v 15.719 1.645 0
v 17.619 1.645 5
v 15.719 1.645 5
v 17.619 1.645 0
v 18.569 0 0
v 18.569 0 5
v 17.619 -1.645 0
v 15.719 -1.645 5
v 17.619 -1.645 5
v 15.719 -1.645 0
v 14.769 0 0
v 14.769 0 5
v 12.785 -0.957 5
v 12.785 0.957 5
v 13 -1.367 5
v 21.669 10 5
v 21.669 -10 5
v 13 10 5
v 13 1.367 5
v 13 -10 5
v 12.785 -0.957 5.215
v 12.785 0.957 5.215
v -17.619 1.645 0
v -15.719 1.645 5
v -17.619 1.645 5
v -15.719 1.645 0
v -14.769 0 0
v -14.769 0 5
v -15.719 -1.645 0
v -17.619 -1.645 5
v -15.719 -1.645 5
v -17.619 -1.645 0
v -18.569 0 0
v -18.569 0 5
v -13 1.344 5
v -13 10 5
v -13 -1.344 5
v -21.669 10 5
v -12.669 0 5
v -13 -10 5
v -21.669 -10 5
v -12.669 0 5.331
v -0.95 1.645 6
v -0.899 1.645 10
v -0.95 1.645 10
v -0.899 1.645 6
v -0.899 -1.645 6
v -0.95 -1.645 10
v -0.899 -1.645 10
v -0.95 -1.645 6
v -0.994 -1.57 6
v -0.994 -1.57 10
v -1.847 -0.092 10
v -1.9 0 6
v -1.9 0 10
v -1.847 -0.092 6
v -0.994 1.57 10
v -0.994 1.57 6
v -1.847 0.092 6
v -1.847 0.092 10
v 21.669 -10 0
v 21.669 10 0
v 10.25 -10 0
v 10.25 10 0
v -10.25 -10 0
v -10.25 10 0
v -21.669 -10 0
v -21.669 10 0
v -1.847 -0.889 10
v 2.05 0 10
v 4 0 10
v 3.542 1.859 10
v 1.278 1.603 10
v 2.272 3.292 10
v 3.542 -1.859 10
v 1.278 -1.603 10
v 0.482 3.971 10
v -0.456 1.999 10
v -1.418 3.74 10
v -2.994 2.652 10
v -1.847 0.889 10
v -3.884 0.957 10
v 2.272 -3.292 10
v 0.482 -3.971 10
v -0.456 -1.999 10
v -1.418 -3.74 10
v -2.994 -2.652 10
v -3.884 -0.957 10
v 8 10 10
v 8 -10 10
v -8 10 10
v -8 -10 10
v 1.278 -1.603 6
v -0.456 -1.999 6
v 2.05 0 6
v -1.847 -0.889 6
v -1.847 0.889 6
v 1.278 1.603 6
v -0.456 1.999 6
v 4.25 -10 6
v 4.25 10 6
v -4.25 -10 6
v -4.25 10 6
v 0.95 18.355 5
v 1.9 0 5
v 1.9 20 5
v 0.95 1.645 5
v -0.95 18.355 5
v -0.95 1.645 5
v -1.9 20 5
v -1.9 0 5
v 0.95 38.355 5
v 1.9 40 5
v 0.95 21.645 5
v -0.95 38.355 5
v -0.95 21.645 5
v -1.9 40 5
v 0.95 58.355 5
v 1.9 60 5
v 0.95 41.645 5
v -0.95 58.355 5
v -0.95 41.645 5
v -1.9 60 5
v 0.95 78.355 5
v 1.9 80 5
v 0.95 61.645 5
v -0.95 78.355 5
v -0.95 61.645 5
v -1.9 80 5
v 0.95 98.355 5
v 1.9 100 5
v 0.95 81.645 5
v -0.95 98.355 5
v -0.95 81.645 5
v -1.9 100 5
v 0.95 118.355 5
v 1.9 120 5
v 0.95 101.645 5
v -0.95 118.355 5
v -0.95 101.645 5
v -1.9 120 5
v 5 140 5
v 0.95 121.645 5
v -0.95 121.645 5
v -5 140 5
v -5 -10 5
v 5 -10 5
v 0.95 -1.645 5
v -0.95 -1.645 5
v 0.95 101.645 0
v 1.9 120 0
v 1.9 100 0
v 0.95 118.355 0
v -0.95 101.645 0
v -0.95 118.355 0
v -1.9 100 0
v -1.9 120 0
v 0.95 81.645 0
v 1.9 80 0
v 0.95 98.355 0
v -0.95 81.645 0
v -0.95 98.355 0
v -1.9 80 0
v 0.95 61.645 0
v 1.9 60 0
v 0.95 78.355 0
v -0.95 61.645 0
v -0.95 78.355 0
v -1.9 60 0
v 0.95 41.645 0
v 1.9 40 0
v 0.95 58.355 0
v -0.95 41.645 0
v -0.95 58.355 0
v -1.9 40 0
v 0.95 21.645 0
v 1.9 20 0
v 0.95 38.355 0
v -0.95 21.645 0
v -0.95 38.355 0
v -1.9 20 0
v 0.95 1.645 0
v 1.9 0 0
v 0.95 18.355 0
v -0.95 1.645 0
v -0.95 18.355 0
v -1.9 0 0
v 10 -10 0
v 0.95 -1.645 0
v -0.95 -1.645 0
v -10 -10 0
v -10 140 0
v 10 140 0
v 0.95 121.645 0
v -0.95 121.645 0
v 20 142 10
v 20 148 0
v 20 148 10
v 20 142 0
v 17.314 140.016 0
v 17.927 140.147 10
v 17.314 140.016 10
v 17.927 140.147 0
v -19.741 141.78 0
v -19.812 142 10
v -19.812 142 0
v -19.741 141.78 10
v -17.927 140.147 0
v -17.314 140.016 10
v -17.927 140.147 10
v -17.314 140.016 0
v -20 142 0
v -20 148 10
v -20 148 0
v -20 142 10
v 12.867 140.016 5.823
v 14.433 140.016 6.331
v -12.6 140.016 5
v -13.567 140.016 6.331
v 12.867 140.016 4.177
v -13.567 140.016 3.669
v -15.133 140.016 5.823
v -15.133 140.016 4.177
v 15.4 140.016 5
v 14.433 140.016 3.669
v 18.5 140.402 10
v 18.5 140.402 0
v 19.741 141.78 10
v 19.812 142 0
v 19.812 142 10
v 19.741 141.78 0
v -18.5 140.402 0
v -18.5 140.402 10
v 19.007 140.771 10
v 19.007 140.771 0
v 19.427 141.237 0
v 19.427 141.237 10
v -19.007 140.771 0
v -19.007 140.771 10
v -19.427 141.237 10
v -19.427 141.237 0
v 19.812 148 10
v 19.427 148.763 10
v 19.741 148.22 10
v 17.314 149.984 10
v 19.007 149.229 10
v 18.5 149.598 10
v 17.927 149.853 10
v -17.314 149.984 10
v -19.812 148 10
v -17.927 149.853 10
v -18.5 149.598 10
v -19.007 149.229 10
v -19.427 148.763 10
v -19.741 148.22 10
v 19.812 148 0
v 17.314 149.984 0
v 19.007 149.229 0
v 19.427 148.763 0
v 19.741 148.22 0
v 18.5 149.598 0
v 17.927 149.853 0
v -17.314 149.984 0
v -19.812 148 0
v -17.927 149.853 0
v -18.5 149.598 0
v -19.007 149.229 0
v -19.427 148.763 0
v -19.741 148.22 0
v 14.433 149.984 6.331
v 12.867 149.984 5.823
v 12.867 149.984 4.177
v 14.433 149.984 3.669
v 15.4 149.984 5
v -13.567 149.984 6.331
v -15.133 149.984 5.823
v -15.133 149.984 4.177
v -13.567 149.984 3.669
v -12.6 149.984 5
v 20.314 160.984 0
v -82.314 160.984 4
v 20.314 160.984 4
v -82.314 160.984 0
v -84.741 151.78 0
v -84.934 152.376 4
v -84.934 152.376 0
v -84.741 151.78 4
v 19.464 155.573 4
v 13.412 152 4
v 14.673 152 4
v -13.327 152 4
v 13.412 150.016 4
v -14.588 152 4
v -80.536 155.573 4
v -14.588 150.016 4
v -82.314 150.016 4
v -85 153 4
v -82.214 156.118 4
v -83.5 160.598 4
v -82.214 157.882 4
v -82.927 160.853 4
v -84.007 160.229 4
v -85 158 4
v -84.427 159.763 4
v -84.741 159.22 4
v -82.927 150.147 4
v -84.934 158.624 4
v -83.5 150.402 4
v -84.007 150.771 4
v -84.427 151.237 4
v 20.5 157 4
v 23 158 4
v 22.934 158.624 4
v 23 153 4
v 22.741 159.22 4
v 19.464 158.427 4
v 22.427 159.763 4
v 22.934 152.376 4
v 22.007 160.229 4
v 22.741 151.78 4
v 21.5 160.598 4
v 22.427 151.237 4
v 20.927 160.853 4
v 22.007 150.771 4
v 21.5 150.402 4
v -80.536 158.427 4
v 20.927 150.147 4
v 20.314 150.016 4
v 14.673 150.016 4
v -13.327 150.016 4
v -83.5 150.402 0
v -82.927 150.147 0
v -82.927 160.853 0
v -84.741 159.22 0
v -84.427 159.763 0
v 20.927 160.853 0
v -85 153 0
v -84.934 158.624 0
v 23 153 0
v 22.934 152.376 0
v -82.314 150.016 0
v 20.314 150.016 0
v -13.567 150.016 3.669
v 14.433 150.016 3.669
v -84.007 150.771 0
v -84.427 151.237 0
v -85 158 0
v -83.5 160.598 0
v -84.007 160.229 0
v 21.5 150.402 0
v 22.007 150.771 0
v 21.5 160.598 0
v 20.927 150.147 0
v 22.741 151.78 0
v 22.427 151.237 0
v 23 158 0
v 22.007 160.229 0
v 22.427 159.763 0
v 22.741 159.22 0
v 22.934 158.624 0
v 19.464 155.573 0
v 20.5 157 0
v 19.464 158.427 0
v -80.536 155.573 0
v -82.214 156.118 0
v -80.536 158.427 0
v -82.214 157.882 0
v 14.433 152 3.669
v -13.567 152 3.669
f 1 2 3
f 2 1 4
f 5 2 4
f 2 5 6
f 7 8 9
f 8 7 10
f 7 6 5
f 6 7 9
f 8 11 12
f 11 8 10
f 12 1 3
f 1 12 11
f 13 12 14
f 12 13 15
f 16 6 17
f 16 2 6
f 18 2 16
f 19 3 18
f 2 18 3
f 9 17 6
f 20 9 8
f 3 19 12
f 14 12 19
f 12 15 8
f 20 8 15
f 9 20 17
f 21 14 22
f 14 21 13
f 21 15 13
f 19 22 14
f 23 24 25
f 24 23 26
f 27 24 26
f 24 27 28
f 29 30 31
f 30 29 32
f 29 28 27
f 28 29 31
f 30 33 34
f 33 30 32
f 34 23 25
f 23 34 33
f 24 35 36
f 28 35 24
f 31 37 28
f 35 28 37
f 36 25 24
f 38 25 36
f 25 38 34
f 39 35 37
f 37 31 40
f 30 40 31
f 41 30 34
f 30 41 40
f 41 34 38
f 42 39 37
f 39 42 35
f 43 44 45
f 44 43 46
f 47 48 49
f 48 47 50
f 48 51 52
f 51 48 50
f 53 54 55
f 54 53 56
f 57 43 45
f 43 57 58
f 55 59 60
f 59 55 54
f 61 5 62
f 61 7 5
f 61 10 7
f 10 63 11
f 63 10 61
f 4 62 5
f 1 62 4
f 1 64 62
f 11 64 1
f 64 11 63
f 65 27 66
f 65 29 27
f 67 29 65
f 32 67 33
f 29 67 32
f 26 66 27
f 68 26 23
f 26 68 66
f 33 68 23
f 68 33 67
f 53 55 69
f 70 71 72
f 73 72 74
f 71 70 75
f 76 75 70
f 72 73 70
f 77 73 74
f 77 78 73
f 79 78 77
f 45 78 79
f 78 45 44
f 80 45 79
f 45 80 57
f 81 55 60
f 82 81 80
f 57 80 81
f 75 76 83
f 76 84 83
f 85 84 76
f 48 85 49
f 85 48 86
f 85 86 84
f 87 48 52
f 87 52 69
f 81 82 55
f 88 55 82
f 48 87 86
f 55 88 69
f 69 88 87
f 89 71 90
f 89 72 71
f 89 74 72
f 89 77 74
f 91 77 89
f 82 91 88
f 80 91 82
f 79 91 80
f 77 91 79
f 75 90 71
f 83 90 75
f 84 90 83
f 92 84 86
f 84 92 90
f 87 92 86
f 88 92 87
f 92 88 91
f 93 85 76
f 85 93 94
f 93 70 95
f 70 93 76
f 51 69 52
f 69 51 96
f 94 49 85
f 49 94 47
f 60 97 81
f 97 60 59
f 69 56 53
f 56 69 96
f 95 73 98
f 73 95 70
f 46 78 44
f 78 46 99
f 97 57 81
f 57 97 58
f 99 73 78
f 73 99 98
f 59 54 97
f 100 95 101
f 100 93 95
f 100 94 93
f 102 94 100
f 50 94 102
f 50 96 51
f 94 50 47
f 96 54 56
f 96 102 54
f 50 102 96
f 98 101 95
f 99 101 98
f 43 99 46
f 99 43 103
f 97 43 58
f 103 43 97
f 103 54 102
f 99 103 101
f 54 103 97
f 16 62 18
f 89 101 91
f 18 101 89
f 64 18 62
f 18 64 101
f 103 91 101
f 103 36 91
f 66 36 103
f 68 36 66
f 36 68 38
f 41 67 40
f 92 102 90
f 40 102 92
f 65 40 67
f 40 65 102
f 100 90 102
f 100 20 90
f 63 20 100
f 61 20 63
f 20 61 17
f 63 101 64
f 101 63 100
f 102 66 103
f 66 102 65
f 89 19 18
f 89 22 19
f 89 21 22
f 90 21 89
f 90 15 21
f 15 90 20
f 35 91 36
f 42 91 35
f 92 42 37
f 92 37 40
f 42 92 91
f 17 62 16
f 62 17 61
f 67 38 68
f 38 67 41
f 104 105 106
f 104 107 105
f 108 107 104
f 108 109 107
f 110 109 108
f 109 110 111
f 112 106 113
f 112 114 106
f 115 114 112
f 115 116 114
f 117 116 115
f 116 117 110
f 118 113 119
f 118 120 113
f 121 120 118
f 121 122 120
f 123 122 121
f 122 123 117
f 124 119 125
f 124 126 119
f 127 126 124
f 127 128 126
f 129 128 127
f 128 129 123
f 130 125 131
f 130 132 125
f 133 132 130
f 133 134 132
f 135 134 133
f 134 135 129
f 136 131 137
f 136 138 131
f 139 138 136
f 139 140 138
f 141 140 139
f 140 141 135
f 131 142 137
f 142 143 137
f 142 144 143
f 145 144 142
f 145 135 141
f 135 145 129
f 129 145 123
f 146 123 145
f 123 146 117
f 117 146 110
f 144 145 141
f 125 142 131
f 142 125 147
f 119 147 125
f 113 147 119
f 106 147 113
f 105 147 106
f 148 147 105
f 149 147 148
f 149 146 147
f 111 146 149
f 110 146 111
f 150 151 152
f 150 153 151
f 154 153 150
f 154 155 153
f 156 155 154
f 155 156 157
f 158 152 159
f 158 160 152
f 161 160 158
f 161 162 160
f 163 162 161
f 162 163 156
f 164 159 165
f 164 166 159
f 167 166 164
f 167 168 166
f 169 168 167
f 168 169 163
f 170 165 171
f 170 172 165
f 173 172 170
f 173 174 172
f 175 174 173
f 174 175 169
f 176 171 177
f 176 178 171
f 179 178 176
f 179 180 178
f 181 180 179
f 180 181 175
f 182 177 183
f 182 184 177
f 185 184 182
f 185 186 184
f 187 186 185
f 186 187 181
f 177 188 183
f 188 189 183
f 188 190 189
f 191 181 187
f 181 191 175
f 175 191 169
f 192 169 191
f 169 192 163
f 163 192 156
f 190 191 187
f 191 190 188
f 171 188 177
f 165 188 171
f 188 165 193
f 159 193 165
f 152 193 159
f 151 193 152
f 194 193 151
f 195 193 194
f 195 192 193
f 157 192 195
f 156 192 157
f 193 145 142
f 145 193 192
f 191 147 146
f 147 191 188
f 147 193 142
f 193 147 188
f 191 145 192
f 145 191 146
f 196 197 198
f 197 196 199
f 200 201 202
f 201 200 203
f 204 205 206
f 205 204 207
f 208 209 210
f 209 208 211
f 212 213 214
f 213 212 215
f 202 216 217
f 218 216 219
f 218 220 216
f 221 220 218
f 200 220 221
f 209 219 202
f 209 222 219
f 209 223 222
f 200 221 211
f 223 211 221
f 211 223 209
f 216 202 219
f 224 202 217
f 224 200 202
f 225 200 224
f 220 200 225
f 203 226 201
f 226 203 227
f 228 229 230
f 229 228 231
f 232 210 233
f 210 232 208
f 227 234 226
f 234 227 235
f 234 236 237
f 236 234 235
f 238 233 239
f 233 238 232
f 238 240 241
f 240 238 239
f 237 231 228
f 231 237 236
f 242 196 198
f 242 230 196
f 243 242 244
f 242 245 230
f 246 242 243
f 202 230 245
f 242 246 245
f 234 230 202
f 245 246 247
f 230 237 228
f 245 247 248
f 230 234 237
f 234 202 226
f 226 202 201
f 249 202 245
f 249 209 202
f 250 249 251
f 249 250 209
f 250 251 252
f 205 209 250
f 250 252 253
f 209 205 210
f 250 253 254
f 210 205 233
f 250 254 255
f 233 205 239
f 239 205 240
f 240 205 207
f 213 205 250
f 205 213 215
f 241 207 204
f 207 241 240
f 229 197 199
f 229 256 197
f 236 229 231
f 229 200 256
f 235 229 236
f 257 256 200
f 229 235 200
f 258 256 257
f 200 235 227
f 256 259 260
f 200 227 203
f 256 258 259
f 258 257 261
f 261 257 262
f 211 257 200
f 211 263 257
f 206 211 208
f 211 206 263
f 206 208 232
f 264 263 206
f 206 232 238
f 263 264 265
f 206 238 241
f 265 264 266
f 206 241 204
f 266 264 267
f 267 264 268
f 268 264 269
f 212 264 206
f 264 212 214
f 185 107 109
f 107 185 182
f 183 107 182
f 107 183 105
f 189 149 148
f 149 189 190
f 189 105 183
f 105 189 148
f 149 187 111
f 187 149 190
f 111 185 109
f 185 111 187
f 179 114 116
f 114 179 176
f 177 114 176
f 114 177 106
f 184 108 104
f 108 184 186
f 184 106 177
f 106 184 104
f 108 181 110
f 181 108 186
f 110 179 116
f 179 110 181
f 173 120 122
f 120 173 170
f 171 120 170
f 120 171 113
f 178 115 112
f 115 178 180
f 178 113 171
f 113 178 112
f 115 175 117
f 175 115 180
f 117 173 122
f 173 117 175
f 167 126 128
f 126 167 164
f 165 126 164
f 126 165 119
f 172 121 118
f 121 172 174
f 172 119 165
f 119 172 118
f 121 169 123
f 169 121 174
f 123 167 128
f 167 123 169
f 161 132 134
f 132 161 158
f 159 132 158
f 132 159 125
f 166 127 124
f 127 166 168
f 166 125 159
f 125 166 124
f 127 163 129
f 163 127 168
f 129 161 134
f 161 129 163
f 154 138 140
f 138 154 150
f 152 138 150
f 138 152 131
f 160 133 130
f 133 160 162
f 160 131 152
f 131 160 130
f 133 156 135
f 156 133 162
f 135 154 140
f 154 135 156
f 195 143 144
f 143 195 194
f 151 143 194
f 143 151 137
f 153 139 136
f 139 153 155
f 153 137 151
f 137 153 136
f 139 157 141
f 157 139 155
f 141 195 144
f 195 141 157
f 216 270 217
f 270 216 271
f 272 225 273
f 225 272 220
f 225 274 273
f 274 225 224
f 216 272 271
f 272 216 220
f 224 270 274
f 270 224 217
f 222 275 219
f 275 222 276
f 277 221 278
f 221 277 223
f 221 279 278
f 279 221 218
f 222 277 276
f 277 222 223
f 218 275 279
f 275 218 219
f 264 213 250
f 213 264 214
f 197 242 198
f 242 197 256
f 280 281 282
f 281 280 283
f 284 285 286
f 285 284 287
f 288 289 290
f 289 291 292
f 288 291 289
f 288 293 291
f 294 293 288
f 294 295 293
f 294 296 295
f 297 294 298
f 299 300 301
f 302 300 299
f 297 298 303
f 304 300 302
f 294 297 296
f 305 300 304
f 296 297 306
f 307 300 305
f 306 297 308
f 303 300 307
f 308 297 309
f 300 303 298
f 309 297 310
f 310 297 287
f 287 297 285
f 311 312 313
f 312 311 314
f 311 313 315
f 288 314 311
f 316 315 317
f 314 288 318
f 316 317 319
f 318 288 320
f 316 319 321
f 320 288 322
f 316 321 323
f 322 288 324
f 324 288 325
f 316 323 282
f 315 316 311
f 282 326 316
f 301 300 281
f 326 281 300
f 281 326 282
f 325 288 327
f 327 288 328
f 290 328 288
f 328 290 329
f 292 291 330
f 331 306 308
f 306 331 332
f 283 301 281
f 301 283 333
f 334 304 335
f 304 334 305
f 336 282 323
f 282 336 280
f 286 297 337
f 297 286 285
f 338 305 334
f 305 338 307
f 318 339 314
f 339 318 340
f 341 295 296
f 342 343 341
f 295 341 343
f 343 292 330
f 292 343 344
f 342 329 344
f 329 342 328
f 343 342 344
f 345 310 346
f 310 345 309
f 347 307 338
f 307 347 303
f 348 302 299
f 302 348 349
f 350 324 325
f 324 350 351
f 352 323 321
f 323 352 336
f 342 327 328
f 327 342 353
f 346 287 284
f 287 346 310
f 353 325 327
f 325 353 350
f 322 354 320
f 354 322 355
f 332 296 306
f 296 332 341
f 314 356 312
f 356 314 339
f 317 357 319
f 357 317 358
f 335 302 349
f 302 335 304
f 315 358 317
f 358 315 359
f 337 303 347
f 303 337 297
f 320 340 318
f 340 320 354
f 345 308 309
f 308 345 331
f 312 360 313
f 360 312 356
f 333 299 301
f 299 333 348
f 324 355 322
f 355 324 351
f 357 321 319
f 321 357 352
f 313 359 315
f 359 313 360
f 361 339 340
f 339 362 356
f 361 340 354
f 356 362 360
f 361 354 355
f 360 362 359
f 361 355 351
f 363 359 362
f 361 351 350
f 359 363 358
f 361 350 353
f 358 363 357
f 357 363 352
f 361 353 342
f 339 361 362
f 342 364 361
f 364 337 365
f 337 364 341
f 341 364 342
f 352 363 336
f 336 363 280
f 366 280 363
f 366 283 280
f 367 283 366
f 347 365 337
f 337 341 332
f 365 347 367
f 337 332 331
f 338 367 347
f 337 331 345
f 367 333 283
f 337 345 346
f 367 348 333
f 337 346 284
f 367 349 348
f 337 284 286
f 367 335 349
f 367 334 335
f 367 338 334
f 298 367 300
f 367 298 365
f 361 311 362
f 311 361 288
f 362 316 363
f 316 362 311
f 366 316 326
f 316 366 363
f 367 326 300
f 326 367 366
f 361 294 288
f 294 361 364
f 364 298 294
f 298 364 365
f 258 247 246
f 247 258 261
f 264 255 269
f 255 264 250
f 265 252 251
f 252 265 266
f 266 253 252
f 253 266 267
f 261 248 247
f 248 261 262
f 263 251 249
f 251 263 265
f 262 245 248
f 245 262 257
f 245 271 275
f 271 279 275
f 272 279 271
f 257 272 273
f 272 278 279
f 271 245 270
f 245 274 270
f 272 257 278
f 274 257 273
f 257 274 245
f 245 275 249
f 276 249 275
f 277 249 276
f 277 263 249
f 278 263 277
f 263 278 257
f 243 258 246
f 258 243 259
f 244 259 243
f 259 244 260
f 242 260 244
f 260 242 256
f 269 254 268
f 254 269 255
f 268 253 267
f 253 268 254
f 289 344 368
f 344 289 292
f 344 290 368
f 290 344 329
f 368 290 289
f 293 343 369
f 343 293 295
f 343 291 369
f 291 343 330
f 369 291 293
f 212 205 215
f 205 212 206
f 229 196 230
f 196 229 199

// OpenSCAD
// file: common_parts.scad
include <tunable_constants.scad>;
//common_flat_screw_tap();
module M3_flat_screw(l = 10, l2 = 0) {
    // l2 is amount of the screw that are bigger for sliding through the hole
    tap_z = 1.9;
    rotate([180,0,0])
    union() {
        cylinder(d = C_M3_DIAMETER_THREAD, h= l);
        cylinder(d = C_M3_DIAMETER, h= l2);
        translate([0,0,-0.1+0.1]) cylinder(d1 = 6.5, d2= C_M3_DIAMETER_THREAD, h= tap_z);
        translate([0,0,-0.1]) cylinder(d = 6.5, h= 0.3);
    }
}

module M4_button_screw(l = 10, l2 = 0) {
    rotate([180,0,0])
    union() {
        cylinder(d = C_M4_DIAMETER_THREAD, h= l);
        cylinder(d = C_M4_DIAMETER, h= l2);
        translate([0,0,-4]) cylinder(d = 8, h=4);
    }
}
module M3_button_screw(l = 10, l2 = 0) {
    rotate([180,0,0])
    union() {
        cylinder(d = C_M3_DIAMETER_THREAD, h= l);
        cylinder(d = C_M3_DIAMETER, h= l2);
        translate([0,0,-4]) cylinder(d =6, h=4);
    }
}

module roundedcube(xdim ,ydim ,zdim,rdim){
    hull(){
        fn=30;
        translate([rdim,rdim,0]) cylinder(r=rdim, h=zdim, $fn=fn);
        translate([xdim-rdim,rdim,0])cylinder(r=rdim, h=zdim, $fn=fn);

        translate([rdim,ydim-rdim,0]) cylinder(r=rdim, h=zdim, $fn=fn);
        translate([xdim-rdim,ydim-rdim,0]) cylinder(r=rdim, h=zdim, $fn=fn);
    }
}
//beam45();
module beam45(w = 10, l = 10, h = 8) {
    difference() {
        union() {
            translate([-w/2,0,0]) cube([w,l,h]);
        }
        translate([w/2,0,0]) rotate([0,45,0])translate([-w-h,-1,0]) cube([w+h*2,l+2,h*2]);
        translate([-w/2,0,0]) rotate([0,-45,0])translate([0-w,-1,0]) cube([w+h*2,l+2,h*2]);
    }
}
//beam30();
module beam30(w = 10, l = 10, h = 8) {
    difference() {
        union() {
            translate([-w/2,0,0]) cube([w,l,h]);
        }
        translate([w/2,0,0]) rotate([0,90-30,0])translate([-w-h,-1,0]) cube([w+h*2,l+2,h*2]);
        translate([-w/2,0,0]) rotate([0,-90+30,0])translate([0-w,-1,0]) cube([w+h*2,l+2,h*2]);
    }
}


module cylinder_outer(height,radius,fn){
   fudge = 1/cos(180/fn);
   cylinder(h=height,r=radius*fudge,$fn=fn);
}

//indicator_dots(2);

module indicator_dots(valueIn) {
    for (a =[0:1:valueIn-1]) {
        translate([a*3,0,0]) cube([2,2,1]);
    }
}
// file: tunable_constants.scad
// Change parameters to fit your printer and slicer differences

C_M3_DIAMETER = 3.3; // size of a hole that a M3 screw will slide through
C_M3_DIAMETER_THREAD = 2.8; // size of a hole that a M3 screw will create own threads in

C_M3_NUT = 7;

C_KINGPIN_LOOSE = 3.5; // The hole for kingpin in the arms that are suposed to slide
C_KINGPIN_SNUG = 3.3; // The hole in the steering hub where the kingpin is suposed to be tightly locked with a screw

C_M4_NUT = 8.4;

C_M4_DIAMETER = 4.1; // size of a hole that a M4 screw will slide through
C_M4_DIAMETER_THREAD = 3.8; // size of a hole that a M4 screw will create own threads in

    b_12mm_tol = 0.3; // tolerance for bearing with 12mm diameter

C_12MM_BEARING_D = 12+b_12mm_tol; // Size of a hole that hold a 12mm bearing
C_12MM_BEARING_H = 3.5;

C_8MM_LOOSE = 8.7; // Loose fitting that will guarantie that it will not touch
C_8MM_TIGHT = 8.2; // Tight fitting for indrive etc
C_8MM_FIT = 8.5; // Perfect fit for it to be removable but not by much force, used for left wheel mount

C_SIGHT_MOUNT_S = 33.3375;

C_MOUNT1_W = 28;
// ############# Settings ################
S_CASTER = 4;
S_CAMBER = 2;

S_BAR_W = 20;
S_BAR_H = 5;
// file: primitive.scad
//
include <tunable_constants.scad>;
use <common_parts.scad>

wall = 4;
w = 3+wall*2;
h = 4;
l = 100;


// mounting to sight part
c_h = 10;
c_w = 40;


prim_base_p();

module prim_base_p() {
    difference() {
        union() {
            translate([-85,0,0]) stick();
            translate([-20,-20,0]) roundedcube(c_w,20,c_h,3);
        }
        screws();
        translate([-20,-28,0]) cube([c_w,20,c_h]);
    }
}

module stick() {
    difference() {
        union() {
            roundedcube(l+wall*2, w, h,3);
            
        }
        hull() {
            translate([wall+0,w-wall,0]) cylinder(d=3, h=h);
            translate([wall+l,w-wall,0]) cylinder(d=3, h=h);
        }
    }
}
%screws();
module screws() {

    translate([C_MOUNT1_W/2,-28,c_h/2]) rotate([90,0,0]) M3_button_screw(l=30,l2=0);
    translate([-C_MOUNT1_W/2,-28,c_h/2]) rotate([90,0,0]) M3_button_screw(l=30,l2=0);
}
// file: mount_beam.scad
//
include <tunable_constants.scad>;
use <common_parts.scad>

w = C_SIGHT_MOUNT_S + 10;
h = 10;
l = 150;


// mounting to sight part
c_h = 10;
c_w = 40;
mount_beam_p();
module mount_beam_p() {
    
    
    difference() {
        union() {
            beam45(w=S_BAR_W, l=l, h=5);
            translate([-20,l,0]) roundedcube(c_w,20,c_h,3);
        }
        screws();
        translate([-20,l+8,0]) cube([c_w,20,c_h]);
    }

}

%screws();
module screws() {
    for (a =[0:20:120]) {
        
        translate([0,10+a,h]) M4_button_screw(l= 20, l2=0);
    }
    translate([C_MOUNT1_W/2,l,c_h/2]) rotate([90,0,0]) M3_button_screw(l2=0);
    translate([-C_MOUNT1_W/2,l,c_h/2]) rotate([90,0,0]) M3_button_screw(l2=0);
}
// file: bowmount.scad
//
include <tunable_constants.scad>;
use <common_parts.scad>

w = C_SIGHT_MOUNT_S + 10;
h = S_BAR_H+5;
l = 20;

bow_mount_p();
module bow_mount_p() {
    
    
    difference() {
        union() {
            translate([-w/2,-l/2,0]) cube([w,l,h]);
        }
        screws();
        translate([0,-l/2,0]) beam45(w=S_BAR_W+0.5, l=l, h=S_BAR_H+1);
        translate([28,-l/2,15]) rotate([0,180,0]) beam45(w=50, l=l, h=10);
        translate([-28,-l/2,15]) rotate([0,180,0]) beam45(w=50, l=l, h=10);
    }

}

%screws();
module screws() {
    translate([C_SIGHT_MOUNT_S/2,0,5]) M4_button_screw();
    translate([-C_SIGHT_MOUNT_S/2,0,5]) M4_button_screw();
    
    translate([0,0,h]) M4_button_screw(l2=20);
}
// main file
//
use <bowmount.scad>
use <mount_beam.scad>
use <primitive.scad>

bow_mount_p();
translate([0,-10,0]) mount_beam_p();

translate([0,150,0]) prim_base_p();
